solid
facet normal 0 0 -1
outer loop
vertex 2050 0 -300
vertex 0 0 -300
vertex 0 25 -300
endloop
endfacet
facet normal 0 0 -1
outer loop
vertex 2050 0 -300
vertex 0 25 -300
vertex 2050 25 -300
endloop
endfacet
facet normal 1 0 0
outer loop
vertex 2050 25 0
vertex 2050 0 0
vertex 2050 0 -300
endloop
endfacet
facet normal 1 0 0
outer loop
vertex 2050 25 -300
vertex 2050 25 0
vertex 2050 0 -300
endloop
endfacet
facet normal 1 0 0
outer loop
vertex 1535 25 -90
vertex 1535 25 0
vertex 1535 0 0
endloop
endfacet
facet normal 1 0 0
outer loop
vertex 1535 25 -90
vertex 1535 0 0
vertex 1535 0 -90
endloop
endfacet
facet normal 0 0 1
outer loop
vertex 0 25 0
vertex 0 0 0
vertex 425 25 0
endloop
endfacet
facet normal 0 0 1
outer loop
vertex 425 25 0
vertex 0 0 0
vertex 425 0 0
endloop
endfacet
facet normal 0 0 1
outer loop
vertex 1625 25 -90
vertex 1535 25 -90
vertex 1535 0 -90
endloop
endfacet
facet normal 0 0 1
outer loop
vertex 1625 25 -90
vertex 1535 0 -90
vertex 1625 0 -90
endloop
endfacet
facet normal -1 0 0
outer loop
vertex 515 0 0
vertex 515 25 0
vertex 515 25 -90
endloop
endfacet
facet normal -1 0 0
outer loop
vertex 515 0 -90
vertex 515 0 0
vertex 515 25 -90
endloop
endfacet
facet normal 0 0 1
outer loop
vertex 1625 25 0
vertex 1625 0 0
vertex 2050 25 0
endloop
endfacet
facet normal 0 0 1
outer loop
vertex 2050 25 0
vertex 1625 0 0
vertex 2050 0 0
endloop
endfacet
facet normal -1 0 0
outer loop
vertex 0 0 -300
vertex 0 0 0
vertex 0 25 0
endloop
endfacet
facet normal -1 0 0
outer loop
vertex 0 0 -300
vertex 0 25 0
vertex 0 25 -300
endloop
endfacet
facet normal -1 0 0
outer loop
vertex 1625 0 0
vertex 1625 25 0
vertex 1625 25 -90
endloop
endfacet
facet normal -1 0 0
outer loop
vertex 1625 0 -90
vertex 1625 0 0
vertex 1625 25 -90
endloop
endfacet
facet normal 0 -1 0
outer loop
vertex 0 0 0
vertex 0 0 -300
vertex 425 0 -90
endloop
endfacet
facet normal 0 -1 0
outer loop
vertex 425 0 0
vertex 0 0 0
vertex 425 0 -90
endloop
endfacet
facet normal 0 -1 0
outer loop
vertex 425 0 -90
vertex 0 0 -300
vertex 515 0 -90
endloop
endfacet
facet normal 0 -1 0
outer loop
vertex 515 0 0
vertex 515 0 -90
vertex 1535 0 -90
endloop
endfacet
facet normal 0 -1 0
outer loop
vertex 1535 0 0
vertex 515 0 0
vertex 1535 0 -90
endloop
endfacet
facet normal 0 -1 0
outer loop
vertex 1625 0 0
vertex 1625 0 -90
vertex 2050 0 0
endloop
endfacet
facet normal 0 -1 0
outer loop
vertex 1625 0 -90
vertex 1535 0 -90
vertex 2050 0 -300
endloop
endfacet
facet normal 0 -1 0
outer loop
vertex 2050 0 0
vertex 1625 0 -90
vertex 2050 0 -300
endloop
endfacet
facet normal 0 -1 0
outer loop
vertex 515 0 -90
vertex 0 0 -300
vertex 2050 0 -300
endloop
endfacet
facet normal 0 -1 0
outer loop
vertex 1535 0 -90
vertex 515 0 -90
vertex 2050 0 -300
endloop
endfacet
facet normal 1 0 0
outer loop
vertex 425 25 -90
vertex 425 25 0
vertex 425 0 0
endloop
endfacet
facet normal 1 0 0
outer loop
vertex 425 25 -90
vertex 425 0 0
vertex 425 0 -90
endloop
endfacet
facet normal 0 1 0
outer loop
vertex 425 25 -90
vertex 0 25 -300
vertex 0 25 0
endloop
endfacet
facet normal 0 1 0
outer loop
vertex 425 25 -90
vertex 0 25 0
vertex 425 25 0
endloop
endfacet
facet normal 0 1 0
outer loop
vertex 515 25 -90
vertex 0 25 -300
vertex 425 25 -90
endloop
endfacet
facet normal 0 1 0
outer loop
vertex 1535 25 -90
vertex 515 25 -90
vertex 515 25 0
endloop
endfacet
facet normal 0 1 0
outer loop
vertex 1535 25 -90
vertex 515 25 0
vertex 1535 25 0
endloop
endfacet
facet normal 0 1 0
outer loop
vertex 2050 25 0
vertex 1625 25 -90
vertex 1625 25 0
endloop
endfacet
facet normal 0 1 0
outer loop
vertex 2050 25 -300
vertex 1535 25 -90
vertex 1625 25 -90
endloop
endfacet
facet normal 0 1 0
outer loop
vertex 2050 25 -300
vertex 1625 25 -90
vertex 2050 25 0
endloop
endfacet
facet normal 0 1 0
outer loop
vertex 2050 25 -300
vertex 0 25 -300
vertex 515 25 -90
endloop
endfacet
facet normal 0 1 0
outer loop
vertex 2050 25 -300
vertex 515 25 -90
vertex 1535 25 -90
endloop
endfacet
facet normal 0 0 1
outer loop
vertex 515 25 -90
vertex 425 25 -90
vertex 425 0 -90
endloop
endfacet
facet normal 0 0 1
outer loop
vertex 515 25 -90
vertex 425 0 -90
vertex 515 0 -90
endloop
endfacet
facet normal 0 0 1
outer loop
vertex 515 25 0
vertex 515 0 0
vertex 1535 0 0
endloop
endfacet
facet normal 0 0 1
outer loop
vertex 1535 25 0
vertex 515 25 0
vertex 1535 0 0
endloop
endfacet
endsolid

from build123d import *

# Parameters (mm, degrees)
SKETCH1_W           = 2050
SKETCH1_H           = 300
BOSS_EXTRUDE1_DEPTH = 25
CUT_EXTRUDE1_REACH  = 2073.986
SKETCH2_W           = 90
SKETCH2_H           = 90


with BuildPart() as part:
    # Sketch1 → Boss-Extrude1 (new body)
    with BuildSketch(Plane(origin=(0, 0, 0), x_dir=(1, 0, 0), z_dir=(0, 1, 0))):
        with Locations((1025, 150)):
            Rectangle(SKETCH1_W, SKETCH1_H)
    extrude(amount=BOSS_EXTRUDE1_DEPTH)

    # Sketch2 → Cut-Extrude1 (cut, up to next)
    with BuildSketch(Plane(origin=(0, 25, 0), x_dir=(1, 0, 0), z_dir=(0, 1, 0)), mode=Mode.PRIVATE) as cut_extrude1_sk1:
        with Locations((470, 45)):
            Rectangle(SKETCH2_W, SKETCH2_H)
    cut_extrude1_tool1 = extrude(cut_extrude1_sk1.sketch, amount=-CUT_EXTRUDE1_REACH, mode=Mode.PRIVATE) & part.part
    # Sketch2 → Cut-Extrude1 (cut, up to next)
    with BuildSketch(Plane(origin=(0, 25, 0), x_dir=(1, 0, 0), z_dir=(0, 1, 0)), mode=Mode.PRIVATE) as cut_extrude1_sk2:
        with Locations((1580, 45)):
            Rectangle(SKETCH2_W, SKETCH2_H)
    cut_extrude1_tool2 = extrude(cut_extrude1_sk2.sketch, amount=-CUT_EXTRUDE1_REACH, mode=Mode.PRIVATE) & part.part
    add(cut_extrude1_tool1.solids().sort_by_distance((470, 25, -45))[0], mode=Mode.SUBTRACT)
    add(cut_extrude1_tool2.solids().sort_by_distance((1580, 25, -45))[0], mode=Mode.SUBTRACT)


solid = part.part
